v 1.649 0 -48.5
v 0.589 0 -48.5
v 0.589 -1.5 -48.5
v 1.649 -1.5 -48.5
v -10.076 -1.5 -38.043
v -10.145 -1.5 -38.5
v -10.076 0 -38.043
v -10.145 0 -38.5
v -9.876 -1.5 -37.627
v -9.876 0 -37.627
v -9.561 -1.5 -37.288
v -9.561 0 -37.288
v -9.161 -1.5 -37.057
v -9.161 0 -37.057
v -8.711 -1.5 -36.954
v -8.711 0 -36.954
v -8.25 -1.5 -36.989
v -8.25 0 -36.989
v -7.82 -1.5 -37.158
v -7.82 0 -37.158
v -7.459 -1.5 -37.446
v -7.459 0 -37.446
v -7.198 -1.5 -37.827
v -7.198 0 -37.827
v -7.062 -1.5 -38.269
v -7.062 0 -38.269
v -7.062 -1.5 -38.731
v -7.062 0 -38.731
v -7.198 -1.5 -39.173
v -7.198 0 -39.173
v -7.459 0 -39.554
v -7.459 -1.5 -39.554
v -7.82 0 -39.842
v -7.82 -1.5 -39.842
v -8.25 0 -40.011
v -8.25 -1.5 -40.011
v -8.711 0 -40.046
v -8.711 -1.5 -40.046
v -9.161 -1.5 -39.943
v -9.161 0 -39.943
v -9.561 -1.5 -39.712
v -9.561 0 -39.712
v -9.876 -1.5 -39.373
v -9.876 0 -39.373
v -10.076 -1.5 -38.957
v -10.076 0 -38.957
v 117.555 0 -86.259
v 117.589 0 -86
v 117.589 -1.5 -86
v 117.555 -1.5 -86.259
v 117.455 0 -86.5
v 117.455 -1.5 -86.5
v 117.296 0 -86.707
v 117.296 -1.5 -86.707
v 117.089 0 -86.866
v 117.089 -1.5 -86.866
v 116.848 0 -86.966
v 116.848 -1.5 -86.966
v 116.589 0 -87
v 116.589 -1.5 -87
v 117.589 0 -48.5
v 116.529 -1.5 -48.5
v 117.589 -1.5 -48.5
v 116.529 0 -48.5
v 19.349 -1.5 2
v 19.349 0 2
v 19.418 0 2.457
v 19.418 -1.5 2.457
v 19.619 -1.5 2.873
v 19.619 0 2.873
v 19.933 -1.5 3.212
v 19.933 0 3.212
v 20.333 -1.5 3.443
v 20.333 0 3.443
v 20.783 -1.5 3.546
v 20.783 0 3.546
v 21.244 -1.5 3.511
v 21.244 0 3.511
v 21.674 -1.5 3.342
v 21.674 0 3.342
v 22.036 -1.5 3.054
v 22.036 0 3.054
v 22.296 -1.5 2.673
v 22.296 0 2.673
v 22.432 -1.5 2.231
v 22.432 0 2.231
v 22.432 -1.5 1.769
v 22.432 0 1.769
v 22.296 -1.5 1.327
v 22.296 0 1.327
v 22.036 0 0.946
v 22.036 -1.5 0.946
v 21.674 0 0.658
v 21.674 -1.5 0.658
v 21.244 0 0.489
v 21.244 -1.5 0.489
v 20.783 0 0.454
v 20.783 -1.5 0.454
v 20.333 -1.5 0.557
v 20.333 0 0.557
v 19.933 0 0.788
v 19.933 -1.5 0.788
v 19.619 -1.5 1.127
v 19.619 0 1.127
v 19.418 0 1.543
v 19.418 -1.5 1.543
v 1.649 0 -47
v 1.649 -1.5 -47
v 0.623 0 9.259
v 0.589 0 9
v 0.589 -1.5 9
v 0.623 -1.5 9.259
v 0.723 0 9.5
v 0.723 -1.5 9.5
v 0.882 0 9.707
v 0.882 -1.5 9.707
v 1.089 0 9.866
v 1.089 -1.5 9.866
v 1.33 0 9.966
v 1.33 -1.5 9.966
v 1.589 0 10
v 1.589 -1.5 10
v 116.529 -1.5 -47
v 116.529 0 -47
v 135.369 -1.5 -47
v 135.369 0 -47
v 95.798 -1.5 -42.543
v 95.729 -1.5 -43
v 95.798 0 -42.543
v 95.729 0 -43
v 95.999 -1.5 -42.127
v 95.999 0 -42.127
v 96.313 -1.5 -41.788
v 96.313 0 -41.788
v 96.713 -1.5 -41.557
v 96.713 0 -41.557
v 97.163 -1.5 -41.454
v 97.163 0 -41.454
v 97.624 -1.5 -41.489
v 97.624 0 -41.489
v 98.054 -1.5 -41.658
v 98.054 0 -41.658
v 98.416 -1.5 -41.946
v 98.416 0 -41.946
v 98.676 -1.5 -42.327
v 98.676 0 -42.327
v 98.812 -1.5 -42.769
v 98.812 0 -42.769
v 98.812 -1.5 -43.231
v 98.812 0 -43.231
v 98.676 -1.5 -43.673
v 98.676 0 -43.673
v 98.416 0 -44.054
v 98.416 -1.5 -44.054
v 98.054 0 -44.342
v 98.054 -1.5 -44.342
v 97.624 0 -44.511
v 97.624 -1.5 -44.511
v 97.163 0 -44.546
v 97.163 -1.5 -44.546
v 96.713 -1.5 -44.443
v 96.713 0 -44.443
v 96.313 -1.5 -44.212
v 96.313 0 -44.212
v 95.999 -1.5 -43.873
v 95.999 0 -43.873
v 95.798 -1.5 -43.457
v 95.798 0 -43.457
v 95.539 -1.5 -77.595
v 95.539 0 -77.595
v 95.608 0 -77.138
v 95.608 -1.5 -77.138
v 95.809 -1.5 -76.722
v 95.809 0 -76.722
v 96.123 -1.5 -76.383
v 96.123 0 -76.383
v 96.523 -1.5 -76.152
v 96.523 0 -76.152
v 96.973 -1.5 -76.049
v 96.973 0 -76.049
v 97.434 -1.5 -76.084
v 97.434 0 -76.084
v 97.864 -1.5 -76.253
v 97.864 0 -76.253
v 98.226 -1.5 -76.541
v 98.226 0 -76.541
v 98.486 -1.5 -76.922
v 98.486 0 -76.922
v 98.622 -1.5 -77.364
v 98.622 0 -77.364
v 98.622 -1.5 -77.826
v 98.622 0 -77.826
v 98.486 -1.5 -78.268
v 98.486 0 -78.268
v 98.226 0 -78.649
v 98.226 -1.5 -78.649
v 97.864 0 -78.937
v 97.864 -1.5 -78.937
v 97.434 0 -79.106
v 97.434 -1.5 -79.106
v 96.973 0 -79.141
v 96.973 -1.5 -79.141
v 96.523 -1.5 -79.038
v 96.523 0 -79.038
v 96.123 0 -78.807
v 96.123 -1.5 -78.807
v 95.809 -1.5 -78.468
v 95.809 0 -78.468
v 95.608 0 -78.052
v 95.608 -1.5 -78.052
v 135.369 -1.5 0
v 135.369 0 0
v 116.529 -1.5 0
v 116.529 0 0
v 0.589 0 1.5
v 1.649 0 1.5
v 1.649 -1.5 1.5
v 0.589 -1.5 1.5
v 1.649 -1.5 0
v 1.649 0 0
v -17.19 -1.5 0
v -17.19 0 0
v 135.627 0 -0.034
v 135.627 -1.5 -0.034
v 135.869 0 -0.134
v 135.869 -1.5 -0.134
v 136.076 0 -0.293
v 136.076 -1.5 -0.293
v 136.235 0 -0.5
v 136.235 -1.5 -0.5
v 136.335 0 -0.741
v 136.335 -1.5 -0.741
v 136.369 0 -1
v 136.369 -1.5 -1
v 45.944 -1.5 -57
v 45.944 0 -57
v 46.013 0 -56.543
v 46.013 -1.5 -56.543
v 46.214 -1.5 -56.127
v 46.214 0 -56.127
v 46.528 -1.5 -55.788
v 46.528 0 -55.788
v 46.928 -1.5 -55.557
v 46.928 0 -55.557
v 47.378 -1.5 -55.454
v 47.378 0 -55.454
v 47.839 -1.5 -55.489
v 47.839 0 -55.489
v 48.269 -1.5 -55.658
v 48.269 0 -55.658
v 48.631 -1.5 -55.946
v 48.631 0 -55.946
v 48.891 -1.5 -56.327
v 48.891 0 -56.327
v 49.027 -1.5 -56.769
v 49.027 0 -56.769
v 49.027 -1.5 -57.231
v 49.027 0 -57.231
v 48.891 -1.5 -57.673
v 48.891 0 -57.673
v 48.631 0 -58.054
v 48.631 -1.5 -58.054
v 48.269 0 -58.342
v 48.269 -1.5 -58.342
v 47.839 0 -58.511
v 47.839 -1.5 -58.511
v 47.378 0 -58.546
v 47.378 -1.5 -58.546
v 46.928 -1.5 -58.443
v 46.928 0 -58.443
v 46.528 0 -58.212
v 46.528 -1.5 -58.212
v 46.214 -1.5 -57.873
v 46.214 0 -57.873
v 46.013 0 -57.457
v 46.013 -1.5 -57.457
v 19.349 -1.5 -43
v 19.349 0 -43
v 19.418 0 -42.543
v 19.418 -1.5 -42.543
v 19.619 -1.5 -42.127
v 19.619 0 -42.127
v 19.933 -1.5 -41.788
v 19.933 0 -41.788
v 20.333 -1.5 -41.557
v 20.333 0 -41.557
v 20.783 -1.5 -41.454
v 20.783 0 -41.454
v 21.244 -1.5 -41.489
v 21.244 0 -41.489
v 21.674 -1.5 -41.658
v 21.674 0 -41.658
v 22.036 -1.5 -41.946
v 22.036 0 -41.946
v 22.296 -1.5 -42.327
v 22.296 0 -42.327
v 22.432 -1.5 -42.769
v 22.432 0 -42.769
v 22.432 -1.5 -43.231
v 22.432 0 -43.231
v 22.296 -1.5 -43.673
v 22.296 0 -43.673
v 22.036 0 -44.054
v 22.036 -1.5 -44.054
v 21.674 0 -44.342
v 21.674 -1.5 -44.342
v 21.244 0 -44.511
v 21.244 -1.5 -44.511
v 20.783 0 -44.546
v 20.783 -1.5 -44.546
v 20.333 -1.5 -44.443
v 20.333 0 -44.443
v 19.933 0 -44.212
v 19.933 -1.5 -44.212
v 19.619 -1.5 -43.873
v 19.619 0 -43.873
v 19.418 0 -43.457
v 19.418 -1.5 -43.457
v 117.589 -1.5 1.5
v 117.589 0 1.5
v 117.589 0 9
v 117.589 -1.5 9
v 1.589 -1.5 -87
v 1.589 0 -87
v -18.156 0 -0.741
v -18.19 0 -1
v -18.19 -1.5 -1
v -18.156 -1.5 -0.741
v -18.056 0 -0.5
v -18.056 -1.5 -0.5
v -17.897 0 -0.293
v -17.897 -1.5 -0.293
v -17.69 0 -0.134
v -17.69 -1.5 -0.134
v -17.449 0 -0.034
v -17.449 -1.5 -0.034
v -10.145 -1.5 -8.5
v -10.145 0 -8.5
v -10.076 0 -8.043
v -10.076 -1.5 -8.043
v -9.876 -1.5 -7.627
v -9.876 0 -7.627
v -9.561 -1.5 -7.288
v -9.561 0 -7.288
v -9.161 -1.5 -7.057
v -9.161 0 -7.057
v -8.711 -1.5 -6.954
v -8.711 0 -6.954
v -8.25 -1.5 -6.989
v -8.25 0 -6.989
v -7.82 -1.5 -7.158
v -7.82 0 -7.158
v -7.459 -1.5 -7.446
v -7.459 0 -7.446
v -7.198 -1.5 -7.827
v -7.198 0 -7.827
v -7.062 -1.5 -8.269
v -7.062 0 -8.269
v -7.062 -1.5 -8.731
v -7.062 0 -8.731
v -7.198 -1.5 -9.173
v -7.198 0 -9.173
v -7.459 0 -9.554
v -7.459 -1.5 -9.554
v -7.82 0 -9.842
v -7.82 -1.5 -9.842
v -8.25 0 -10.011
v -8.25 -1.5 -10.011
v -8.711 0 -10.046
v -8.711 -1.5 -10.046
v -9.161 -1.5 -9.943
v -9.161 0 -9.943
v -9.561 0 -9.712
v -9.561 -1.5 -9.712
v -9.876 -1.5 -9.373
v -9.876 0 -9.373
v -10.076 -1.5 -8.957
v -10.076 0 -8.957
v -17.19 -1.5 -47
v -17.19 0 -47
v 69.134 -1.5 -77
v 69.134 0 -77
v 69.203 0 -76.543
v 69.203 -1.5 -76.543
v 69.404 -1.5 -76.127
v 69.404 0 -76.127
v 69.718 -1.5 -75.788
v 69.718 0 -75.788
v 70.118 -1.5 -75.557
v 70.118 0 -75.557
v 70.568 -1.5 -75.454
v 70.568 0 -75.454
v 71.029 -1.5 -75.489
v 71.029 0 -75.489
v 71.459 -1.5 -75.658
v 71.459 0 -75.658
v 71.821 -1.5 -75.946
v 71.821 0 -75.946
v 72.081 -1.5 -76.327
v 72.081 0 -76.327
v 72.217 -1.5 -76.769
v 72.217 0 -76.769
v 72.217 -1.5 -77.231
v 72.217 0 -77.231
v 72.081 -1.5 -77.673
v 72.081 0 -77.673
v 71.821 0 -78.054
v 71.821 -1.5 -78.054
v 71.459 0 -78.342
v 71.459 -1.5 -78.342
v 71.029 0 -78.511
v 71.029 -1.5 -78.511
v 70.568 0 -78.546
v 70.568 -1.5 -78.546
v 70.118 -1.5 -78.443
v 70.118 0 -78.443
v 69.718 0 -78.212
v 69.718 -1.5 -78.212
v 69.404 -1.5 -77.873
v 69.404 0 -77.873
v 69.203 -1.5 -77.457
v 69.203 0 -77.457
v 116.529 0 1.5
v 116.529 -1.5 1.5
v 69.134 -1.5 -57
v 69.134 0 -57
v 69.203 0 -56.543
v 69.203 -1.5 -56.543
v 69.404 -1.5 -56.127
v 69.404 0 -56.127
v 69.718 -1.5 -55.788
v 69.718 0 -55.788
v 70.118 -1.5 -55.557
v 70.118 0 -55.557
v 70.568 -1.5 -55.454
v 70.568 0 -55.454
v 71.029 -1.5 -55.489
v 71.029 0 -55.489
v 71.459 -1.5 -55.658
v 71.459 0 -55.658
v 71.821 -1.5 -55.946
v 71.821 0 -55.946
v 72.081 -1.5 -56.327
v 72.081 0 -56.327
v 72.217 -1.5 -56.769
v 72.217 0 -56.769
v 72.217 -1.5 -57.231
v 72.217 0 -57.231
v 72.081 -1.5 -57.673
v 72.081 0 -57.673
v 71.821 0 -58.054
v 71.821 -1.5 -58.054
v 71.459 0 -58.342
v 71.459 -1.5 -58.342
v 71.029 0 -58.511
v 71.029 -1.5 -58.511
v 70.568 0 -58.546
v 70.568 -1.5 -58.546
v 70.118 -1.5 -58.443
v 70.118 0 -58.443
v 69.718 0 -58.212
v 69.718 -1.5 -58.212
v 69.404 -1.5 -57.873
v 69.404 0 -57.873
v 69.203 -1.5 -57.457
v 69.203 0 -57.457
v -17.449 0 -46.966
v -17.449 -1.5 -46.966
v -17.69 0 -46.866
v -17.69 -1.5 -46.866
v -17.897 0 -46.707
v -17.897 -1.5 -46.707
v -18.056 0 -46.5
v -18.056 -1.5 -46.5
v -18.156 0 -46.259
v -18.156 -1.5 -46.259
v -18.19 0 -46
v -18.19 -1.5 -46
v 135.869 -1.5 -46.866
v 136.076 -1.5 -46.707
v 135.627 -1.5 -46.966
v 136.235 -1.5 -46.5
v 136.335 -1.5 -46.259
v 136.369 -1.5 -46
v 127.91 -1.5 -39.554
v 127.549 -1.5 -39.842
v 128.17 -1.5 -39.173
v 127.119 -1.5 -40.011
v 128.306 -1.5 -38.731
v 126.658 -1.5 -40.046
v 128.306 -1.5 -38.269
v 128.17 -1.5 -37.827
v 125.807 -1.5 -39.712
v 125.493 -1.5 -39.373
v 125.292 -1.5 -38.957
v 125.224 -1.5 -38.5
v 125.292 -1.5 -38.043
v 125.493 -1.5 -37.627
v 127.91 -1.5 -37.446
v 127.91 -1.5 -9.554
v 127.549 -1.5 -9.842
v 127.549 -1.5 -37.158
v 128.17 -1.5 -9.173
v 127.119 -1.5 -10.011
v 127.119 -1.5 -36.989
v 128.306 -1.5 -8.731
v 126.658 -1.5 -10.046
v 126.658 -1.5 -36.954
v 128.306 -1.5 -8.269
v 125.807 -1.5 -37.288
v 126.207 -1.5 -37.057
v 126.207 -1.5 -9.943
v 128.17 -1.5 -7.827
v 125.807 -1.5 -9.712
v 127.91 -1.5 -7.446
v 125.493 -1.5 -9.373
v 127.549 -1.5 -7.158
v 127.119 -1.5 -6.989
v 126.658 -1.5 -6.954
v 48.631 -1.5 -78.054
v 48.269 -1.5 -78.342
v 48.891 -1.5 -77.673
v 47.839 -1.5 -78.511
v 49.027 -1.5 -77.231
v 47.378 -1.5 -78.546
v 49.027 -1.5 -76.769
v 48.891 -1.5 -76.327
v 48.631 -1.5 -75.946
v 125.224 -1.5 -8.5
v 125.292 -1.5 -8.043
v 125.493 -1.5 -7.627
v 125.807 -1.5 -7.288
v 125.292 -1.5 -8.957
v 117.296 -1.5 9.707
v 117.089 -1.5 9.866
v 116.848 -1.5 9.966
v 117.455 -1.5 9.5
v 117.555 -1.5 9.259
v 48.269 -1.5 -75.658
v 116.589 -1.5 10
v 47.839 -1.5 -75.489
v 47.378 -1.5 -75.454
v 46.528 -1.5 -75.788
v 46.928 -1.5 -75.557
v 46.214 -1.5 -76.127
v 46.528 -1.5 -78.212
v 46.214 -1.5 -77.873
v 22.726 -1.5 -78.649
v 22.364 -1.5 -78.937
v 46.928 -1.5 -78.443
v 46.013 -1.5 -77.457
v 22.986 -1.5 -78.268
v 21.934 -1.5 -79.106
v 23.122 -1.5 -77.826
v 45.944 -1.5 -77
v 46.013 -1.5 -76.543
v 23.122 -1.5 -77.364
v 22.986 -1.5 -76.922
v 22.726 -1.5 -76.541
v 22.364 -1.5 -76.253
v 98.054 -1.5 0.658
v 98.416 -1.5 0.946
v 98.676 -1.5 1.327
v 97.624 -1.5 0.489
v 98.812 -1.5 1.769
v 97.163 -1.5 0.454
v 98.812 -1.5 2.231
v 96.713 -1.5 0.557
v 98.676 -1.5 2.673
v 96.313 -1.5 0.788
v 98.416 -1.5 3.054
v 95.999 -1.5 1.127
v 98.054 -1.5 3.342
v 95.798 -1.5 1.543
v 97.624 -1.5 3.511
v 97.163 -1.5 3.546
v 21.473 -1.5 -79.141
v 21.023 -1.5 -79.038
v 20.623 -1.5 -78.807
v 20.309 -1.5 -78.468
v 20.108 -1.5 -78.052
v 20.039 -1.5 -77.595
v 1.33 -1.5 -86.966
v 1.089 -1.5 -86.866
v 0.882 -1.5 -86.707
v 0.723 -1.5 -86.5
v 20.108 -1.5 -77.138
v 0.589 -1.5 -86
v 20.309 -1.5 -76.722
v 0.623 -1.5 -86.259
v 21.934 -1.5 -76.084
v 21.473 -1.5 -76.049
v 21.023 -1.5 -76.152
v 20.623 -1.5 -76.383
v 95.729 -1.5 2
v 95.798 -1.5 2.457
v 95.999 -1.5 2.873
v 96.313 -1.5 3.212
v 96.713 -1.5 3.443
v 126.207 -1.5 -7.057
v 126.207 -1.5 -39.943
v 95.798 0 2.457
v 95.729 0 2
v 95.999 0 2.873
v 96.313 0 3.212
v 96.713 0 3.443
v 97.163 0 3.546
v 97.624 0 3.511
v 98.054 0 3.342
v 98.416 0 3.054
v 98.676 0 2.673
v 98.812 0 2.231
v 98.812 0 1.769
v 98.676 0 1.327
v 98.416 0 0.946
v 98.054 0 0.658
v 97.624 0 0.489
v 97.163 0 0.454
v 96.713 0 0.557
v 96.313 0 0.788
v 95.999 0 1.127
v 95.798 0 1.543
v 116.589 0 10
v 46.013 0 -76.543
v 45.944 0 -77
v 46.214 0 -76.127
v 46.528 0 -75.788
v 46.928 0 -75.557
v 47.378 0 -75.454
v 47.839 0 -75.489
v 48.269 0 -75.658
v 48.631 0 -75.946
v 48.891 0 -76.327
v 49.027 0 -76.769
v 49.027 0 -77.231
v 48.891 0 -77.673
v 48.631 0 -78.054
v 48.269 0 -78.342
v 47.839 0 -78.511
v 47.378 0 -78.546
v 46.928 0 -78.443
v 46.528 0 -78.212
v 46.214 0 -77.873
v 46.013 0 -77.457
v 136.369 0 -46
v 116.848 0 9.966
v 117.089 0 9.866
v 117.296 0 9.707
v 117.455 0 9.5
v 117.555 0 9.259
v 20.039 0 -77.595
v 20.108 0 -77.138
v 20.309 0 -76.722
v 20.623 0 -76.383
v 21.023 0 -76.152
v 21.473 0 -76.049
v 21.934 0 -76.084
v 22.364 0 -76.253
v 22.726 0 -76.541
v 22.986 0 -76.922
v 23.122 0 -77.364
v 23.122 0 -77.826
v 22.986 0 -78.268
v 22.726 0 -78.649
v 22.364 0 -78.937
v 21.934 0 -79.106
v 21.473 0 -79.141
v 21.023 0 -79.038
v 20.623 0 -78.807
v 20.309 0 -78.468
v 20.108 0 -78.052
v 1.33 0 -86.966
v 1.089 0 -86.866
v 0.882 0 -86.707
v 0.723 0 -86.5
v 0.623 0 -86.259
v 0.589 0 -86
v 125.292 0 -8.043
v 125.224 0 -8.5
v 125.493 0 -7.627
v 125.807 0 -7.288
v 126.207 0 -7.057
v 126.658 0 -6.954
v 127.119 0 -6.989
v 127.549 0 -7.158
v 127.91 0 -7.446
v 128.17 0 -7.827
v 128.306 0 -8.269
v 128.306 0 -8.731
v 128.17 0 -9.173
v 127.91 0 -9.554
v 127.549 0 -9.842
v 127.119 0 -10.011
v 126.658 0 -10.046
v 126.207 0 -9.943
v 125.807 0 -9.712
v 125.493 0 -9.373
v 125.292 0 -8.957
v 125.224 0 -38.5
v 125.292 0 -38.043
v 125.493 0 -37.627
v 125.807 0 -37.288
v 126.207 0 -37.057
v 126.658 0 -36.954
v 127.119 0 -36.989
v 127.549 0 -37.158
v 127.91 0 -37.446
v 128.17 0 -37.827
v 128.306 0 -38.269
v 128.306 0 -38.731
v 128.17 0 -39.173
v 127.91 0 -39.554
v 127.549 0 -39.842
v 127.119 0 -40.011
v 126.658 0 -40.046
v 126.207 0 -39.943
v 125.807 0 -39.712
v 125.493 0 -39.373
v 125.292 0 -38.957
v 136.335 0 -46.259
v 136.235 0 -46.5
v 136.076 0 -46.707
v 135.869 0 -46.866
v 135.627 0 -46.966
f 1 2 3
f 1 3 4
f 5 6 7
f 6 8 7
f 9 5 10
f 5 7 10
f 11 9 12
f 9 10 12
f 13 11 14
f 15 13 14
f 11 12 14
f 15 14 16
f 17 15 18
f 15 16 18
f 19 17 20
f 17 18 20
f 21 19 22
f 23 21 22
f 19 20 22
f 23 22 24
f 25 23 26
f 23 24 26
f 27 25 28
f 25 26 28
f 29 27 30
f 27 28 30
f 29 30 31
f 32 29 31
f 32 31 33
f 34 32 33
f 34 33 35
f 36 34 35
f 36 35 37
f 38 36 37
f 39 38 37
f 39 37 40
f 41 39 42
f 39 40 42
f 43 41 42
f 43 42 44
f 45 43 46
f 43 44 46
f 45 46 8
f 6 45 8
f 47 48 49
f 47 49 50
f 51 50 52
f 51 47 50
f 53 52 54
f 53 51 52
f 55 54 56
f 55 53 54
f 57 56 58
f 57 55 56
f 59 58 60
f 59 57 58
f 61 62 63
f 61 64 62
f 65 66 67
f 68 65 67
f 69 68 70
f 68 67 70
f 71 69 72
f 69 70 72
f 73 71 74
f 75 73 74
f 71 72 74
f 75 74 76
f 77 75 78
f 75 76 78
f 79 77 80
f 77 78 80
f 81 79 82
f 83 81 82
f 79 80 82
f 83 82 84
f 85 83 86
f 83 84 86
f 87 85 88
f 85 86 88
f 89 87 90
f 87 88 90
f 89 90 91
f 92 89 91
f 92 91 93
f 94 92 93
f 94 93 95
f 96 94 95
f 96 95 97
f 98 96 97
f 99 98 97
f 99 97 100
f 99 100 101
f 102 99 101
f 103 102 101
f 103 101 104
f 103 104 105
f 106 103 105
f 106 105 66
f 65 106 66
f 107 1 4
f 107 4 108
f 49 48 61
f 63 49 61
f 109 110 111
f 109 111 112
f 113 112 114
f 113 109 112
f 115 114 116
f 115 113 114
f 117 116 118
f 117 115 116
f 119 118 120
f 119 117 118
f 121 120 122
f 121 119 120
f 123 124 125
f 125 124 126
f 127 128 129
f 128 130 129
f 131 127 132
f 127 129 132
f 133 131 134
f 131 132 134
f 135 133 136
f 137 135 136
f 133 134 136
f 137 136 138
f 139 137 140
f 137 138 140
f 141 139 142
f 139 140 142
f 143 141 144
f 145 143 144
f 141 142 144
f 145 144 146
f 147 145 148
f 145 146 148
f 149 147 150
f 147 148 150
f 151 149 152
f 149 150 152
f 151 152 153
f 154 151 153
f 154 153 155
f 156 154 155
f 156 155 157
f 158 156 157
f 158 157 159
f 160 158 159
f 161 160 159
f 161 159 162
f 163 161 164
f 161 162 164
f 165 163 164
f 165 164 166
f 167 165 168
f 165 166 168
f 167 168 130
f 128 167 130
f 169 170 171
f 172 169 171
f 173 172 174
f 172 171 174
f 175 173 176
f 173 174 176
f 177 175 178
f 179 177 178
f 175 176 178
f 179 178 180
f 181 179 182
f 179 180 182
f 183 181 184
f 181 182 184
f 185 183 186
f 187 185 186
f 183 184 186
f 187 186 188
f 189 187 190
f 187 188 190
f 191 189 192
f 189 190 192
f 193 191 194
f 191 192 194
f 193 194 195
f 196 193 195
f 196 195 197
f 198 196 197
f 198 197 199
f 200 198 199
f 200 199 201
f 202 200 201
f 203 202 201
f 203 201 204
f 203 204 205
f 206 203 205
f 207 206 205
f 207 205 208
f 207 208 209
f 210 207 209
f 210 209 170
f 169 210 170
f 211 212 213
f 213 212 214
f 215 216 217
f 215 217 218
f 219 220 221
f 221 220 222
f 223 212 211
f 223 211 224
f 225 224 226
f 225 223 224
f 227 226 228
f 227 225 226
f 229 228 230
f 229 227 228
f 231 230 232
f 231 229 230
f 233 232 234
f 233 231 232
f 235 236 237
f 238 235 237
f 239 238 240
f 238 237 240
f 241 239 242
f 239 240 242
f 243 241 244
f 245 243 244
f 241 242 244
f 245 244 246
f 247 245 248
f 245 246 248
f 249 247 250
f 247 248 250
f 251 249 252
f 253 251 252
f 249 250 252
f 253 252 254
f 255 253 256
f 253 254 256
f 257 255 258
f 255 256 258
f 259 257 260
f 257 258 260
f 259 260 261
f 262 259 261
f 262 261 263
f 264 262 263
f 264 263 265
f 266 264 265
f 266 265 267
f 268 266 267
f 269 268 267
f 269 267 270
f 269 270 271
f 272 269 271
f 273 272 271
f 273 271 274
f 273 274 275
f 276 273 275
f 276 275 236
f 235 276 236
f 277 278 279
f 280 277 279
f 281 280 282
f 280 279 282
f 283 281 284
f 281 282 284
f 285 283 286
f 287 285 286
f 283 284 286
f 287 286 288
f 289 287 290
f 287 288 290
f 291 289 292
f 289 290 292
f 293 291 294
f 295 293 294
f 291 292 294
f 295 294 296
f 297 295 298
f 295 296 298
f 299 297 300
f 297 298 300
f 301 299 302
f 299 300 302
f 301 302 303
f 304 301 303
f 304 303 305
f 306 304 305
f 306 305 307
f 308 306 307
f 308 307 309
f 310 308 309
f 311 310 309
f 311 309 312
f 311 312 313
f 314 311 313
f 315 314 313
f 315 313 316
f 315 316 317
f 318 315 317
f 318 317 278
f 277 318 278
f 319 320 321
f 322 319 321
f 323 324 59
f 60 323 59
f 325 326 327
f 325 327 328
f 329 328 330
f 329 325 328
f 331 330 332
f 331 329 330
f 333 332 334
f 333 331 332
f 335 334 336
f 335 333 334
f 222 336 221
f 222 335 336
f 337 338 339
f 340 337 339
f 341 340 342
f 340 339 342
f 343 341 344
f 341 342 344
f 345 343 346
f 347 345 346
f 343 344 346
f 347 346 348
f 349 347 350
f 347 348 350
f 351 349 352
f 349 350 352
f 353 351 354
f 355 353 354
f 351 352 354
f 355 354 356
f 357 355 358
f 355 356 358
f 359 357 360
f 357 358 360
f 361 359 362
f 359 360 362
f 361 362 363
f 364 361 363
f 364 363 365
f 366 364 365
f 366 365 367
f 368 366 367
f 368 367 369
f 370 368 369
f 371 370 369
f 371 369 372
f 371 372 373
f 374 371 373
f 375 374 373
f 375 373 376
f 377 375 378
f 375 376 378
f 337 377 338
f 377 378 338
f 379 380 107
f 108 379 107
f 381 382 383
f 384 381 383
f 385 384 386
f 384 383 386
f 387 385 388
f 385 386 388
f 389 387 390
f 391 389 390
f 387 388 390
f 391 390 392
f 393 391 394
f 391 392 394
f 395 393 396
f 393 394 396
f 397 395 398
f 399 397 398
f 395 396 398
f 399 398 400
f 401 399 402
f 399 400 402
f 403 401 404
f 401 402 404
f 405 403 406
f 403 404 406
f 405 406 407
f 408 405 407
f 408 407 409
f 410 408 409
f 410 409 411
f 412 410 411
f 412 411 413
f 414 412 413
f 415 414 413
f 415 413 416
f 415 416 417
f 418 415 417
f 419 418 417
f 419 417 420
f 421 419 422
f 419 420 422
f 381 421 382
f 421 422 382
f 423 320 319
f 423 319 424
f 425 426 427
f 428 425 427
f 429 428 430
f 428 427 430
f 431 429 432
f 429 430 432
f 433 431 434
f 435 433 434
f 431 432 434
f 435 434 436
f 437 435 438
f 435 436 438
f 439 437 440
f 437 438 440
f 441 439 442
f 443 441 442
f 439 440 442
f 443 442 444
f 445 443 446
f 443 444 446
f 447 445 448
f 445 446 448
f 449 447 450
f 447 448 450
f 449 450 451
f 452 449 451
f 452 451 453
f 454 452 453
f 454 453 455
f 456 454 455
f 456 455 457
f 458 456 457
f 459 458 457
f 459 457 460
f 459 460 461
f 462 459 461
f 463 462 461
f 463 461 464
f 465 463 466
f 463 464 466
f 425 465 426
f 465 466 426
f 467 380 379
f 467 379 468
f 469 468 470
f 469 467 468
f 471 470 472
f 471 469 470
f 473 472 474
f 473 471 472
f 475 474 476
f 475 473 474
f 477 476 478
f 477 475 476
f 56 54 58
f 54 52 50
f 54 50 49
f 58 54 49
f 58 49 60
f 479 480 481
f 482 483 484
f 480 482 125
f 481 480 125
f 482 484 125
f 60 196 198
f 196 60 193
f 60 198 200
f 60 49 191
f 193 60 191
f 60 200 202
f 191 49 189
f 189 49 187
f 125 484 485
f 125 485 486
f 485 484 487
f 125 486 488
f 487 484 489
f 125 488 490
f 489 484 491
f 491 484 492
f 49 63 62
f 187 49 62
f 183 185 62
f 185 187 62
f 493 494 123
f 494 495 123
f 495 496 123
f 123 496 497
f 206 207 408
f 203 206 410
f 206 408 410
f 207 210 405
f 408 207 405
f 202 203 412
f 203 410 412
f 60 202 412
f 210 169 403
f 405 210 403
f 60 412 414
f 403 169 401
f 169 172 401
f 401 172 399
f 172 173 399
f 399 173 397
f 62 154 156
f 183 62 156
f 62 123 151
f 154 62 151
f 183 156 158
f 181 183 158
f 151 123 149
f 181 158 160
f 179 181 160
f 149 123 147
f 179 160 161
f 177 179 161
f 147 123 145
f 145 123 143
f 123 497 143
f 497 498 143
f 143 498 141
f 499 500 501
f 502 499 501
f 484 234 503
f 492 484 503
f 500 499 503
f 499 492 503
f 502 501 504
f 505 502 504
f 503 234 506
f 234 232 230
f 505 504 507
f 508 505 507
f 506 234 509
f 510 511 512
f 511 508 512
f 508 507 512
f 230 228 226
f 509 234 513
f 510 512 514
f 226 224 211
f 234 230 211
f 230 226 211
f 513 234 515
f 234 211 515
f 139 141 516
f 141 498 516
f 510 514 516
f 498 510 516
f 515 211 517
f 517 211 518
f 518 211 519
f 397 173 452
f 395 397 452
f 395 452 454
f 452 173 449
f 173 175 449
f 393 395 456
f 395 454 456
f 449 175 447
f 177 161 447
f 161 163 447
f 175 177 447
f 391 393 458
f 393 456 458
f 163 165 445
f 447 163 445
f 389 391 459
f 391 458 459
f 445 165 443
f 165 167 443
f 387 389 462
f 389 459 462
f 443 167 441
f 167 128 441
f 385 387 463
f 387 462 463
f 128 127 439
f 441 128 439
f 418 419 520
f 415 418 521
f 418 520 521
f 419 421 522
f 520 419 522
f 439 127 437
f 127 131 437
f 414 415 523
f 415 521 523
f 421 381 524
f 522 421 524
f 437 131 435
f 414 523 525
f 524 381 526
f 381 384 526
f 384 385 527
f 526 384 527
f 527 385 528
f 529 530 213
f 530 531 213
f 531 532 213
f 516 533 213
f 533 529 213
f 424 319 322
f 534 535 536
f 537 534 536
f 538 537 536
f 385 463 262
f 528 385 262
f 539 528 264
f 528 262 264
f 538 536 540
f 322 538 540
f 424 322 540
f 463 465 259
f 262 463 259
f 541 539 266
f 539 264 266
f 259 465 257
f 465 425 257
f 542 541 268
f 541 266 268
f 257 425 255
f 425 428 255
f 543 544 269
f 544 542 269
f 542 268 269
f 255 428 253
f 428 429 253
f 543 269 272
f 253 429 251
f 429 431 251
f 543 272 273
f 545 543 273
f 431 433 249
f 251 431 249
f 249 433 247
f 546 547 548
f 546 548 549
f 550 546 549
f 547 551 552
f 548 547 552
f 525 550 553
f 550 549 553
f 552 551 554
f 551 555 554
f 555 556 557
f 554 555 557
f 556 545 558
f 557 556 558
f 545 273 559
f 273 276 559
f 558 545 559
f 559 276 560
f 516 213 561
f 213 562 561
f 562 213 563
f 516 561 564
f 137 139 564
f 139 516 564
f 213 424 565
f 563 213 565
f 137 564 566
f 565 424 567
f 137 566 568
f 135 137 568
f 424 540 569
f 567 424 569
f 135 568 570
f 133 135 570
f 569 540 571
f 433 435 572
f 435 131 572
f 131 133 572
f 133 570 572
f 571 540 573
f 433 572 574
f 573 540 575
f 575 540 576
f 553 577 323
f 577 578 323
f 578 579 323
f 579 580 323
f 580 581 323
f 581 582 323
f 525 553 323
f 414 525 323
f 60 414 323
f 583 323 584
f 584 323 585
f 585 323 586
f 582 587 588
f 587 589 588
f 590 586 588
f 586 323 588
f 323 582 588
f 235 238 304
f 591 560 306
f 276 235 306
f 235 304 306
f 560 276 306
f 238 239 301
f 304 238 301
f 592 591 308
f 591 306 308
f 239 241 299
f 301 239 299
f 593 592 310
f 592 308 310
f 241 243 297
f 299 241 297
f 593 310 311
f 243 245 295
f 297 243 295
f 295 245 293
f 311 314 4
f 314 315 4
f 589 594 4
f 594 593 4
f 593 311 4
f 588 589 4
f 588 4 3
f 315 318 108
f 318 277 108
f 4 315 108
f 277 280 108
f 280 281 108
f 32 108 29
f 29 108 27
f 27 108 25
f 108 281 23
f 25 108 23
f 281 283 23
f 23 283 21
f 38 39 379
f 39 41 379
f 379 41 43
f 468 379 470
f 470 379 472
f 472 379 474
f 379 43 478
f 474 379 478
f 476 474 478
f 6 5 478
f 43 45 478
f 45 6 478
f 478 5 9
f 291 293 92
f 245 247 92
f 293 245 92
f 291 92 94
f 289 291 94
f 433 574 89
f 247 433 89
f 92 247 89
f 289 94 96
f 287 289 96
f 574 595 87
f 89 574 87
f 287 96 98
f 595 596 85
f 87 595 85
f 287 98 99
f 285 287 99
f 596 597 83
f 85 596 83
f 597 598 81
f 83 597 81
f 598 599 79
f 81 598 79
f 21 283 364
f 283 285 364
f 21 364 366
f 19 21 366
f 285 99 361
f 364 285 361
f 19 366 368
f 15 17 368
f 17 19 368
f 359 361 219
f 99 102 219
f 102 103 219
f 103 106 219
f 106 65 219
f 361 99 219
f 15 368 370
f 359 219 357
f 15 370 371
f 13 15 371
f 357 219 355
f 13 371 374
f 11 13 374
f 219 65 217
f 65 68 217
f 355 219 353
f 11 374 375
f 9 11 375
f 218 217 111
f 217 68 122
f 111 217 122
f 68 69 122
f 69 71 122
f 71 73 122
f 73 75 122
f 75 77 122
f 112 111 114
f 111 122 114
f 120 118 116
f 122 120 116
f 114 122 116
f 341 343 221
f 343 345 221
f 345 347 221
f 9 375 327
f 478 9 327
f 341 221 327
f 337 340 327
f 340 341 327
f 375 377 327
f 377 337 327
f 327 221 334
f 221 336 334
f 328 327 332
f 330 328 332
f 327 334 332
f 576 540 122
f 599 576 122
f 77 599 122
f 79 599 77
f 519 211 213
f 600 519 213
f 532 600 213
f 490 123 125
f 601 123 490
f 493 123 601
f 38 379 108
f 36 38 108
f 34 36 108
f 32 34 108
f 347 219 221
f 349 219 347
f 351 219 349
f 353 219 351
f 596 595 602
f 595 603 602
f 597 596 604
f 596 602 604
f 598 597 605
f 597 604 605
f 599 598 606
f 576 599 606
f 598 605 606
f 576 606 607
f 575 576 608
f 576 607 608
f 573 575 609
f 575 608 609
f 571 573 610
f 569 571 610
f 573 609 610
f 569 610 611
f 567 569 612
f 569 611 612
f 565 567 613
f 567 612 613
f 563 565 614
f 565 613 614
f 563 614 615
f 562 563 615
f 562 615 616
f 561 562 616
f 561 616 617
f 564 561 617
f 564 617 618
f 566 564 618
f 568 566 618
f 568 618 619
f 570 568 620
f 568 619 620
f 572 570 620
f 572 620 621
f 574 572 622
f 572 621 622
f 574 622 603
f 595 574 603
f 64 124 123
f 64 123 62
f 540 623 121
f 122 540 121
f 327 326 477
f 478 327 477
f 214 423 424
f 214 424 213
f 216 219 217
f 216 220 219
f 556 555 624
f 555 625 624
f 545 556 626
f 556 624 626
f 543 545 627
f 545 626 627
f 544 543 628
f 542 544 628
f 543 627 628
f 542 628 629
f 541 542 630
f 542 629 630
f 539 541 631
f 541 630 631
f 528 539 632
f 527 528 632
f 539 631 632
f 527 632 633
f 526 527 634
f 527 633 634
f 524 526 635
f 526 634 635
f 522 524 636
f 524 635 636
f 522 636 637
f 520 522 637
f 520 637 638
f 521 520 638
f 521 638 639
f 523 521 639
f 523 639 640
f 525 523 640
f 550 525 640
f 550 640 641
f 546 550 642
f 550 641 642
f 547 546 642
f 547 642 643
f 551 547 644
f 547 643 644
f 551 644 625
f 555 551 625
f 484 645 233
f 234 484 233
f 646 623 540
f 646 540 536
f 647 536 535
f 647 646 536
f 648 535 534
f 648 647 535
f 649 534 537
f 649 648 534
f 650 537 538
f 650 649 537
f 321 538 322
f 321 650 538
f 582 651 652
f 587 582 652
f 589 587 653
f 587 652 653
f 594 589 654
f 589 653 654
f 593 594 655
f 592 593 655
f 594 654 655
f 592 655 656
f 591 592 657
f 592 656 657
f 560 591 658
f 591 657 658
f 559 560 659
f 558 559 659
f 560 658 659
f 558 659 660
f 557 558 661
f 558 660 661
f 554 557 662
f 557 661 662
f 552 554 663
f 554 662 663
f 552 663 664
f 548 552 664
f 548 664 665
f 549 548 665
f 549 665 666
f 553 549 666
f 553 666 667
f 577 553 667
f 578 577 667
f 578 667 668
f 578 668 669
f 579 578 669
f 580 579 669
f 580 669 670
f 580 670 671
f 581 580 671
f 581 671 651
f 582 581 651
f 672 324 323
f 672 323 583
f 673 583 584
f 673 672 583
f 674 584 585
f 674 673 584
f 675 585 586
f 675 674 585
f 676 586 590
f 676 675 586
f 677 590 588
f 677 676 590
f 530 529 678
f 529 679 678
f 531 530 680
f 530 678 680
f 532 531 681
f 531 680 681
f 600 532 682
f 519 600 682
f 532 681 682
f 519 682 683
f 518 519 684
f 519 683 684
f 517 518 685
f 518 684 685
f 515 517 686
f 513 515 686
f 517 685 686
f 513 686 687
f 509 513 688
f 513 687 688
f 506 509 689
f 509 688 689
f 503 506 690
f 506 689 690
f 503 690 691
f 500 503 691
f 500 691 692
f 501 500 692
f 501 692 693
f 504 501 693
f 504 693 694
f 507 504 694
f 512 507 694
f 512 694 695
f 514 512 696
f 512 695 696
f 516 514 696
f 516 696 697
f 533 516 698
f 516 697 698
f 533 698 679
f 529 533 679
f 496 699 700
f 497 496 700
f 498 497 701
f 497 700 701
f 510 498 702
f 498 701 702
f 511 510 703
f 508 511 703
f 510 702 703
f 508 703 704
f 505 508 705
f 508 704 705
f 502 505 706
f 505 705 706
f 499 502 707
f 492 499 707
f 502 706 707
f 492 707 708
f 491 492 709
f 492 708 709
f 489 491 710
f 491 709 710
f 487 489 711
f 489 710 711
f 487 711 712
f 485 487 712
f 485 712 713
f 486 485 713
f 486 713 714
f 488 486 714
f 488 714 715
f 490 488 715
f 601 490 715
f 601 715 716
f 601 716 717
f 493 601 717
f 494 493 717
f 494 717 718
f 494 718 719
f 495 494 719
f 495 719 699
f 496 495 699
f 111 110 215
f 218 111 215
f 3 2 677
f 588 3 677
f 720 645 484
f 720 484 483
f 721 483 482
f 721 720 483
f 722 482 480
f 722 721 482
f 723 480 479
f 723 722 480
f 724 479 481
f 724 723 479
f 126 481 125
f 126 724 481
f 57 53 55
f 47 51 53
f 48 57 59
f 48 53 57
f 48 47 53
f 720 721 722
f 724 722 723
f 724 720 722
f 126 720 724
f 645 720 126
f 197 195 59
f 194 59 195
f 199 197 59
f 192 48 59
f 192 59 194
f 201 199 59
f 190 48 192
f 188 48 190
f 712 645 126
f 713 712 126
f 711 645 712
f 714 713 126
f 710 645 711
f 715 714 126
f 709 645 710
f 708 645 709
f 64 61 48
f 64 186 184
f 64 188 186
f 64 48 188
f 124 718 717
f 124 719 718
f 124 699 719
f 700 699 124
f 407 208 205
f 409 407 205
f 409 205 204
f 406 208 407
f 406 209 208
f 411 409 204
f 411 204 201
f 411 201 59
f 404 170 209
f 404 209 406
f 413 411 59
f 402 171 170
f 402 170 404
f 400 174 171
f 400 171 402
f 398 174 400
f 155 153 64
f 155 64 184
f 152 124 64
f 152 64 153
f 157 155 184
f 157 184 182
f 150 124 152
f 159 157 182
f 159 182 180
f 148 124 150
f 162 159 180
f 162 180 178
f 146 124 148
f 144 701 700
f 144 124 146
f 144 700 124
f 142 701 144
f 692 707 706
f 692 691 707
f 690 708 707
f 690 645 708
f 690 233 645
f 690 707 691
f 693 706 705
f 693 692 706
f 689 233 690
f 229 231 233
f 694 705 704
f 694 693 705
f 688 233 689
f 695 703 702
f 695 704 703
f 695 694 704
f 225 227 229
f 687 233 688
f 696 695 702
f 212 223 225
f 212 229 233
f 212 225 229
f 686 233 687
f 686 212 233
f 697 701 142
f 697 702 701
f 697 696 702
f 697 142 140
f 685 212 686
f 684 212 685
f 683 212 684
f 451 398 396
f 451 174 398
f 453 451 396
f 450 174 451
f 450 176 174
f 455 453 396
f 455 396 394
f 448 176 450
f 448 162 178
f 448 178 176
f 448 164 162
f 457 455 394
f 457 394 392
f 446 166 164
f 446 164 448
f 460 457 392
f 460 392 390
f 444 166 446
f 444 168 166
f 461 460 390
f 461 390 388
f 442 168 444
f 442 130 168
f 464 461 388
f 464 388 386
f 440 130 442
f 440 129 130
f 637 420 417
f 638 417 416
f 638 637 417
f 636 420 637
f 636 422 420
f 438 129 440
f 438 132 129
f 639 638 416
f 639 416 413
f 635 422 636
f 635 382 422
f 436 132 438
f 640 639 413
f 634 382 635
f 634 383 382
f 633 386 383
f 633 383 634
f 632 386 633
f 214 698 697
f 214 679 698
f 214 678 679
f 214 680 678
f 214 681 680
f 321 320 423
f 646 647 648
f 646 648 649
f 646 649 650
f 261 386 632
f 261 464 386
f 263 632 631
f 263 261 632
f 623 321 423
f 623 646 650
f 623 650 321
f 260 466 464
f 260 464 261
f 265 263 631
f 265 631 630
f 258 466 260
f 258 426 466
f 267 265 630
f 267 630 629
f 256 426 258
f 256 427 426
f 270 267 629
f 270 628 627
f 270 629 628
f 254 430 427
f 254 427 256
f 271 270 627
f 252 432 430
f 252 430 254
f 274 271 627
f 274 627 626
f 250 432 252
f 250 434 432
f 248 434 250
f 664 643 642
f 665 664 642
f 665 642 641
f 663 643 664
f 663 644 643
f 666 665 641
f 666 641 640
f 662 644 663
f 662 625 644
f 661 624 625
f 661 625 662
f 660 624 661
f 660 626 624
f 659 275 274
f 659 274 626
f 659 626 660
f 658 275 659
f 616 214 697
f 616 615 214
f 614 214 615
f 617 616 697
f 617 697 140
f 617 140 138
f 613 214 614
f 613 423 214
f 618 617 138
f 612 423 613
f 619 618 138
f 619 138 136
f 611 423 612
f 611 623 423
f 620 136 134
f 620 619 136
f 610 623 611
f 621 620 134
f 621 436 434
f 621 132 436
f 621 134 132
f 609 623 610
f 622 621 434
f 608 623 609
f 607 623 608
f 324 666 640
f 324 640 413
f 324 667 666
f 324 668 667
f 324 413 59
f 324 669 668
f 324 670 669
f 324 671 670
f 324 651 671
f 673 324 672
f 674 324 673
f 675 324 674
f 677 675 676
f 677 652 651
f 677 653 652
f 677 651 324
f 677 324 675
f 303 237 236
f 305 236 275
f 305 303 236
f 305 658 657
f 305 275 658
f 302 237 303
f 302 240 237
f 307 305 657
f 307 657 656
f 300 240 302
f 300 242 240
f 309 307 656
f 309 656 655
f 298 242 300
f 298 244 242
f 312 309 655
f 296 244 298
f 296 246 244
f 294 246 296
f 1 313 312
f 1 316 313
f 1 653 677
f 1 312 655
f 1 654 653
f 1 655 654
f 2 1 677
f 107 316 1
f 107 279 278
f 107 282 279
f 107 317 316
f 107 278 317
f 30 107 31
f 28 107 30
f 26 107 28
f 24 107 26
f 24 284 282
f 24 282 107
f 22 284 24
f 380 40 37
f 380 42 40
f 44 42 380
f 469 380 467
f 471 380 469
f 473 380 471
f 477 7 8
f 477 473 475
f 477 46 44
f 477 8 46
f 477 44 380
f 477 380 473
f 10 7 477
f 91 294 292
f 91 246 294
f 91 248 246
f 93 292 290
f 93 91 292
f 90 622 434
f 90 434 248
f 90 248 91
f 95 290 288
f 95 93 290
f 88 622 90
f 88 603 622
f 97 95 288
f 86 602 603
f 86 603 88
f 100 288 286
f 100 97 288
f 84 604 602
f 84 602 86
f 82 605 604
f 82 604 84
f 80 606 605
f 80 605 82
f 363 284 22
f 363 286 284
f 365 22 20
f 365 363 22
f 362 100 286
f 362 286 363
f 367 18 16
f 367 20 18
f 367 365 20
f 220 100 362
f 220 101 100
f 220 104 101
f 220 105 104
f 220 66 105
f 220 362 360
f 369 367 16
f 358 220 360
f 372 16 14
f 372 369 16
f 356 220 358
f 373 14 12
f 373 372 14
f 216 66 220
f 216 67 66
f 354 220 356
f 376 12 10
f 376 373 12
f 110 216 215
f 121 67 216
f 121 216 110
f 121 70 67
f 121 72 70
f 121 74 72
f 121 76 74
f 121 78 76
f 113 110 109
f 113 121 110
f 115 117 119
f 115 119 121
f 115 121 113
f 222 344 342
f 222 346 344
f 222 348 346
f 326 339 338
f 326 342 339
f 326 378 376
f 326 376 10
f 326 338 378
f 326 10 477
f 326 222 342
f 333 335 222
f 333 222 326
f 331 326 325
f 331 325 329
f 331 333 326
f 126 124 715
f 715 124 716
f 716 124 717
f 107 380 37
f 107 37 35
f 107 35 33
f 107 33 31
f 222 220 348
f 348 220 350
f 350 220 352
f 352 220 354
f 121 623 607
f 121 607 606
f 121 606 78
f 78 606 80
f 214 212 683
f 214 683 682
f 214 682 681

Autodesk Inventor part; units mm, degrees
ref_plane "YZ Plane" through (0, 0, 0) normal (1, 0, 0) x (0, 1, 0)
ref_plane "XZ Plane" through (0, 0, 0) normal (0, 1, 0) x (-1, 0, 0)
ref_plane "XY Plane" through (0, 0, 0) normal (0, 0, 1) x (1, 0, 0)
sketch "Sketch1" plane through (0, 0, 0) normal (0, 1, 0) x (-1, 0, 0)
  line L0 (-0.4496, -47) -> (-0.4496, 0)
  line L1 (-117.7289, 0) -> (-117.7289, -47)
  circle A0 centre (-97.2793, 2) radius 1.55
  circle A1 centre (-97.2793, -43) radius 1.55
  circle A2 centre (-20.8993, 2) radius 1.55
  circle A3 centre (-20.8993, -43) radius 1.55
  circle A4 centre (-70.6843, -57) radius 1.55
  circle A5 centre (-47.4943, -57) radius 1.55
  circle A6 centre (-47.4943, -77) radius 1.55
  circle A7 centre (-70.6843, -77) radius 1.55
  circle A8 centre (-97.0893, -77.595) radius 1.55
  circle A9 centre (-21.5893, -77.595) radius 1.55
  circle A10 centre (-126.7736, -8.5) radius 1.55
  circle A11 centre (8.595, -8.5) radius 1.55
  circle A12 centre (-126.7736, -38.5) radius 1.55
  circle A13 centre (8.595, -38.5) radius 1.55
  arc A14 (17.19, -47) -> (18.19, -46) centre (17.19, -46) ccw
  line L2 (18.19, -1) -> (18.19, -46)
  arc A15 (-1.5893, -87) -> (-0.5893, -86) centre (-1.5893, -86) ccw
  line L3 (-0.5893, -48.5) -> (-0.5893, -86)
  arc A16 (-117.5893, -86) -> (-116.5893, -87) centre (-116.5893, -86) ccw
  line L4 (-117.5893, -86) -> (-117.5893, -48.5)
  arc A17 (-136.3686, -46) -> (-135.3686, -47) centre (-135.3686, -46) ccw
  arc A18 (-135.3686, 0) -> (-136.3686, -1) centre (-135.3686, -1) ccw
  line L5 (-135.3686, 0) -> (-116.5293, 0)
  arc A19 (-116.5893, 10) -> (-117.5893, 9) centre (-116.5893, 9) ccw
  line L6 (-116.5893, 10) -> (-1.5893, 10)
  arc A20 (-0.5893, 9) -> (-1.5893, 10) centre (-1.5893, 9) ccw
  arc A21 (18.19, -1) -> (17.19, 0) centre (17.19, -1) ccw
  line L7 (-136.3686, -46) -> (-136.3686, -1)
  line L8 (17.19, -47) -> (-1.6493, -47)
  line L9 (-1.6493, 0) -> (17.19, 0)
  line L10 (-1.6493, 0) -> (-1.6493, 1.5)
  line L11 (-1.6493, 1.5) -> (-0.5893, 1.5)
  line L12 (-0.5893, 9) -> (-0.5893, 1.5)
  line L13 (-117.5893, 1.5) -> (-117.5893, 9)
  line L14 (-117.5893, 1.5) -> (-116.5293, 1.5)
  line L15 (-116.5293, 1.5) -> (-116.5293, 0)
  line L16 (-116.5293, -47) -> (-135.3686, -47)
  line L17 (-116.5293, -47) -> (-116.5293, -48.5)
  line L18 (-116.5293, -48.5) -> (-117.5893, -48.5)
  line L19 (-1.5893, -87) -> (-116.5893, -87)
  line L20 (-0.5893, -48.5) -> (-1.6493, -48.5)
  line L21 (-1.6493, -48.5) -> (-1.6493, -47)
  line L22 (-118.1786, -47) -> (-118.1786, 0)
  line L23 (-117.2793, 0) -> (-117.2793, -47)
  line L24 (-0.8993, -47) -> (-0.8993, 0)
  line L25 (0, 0) -> (0, -47)
extrude "Extrusion1" add sketch "Sketch1" against normal blind 1.5
properties part number "body_front_frame"
